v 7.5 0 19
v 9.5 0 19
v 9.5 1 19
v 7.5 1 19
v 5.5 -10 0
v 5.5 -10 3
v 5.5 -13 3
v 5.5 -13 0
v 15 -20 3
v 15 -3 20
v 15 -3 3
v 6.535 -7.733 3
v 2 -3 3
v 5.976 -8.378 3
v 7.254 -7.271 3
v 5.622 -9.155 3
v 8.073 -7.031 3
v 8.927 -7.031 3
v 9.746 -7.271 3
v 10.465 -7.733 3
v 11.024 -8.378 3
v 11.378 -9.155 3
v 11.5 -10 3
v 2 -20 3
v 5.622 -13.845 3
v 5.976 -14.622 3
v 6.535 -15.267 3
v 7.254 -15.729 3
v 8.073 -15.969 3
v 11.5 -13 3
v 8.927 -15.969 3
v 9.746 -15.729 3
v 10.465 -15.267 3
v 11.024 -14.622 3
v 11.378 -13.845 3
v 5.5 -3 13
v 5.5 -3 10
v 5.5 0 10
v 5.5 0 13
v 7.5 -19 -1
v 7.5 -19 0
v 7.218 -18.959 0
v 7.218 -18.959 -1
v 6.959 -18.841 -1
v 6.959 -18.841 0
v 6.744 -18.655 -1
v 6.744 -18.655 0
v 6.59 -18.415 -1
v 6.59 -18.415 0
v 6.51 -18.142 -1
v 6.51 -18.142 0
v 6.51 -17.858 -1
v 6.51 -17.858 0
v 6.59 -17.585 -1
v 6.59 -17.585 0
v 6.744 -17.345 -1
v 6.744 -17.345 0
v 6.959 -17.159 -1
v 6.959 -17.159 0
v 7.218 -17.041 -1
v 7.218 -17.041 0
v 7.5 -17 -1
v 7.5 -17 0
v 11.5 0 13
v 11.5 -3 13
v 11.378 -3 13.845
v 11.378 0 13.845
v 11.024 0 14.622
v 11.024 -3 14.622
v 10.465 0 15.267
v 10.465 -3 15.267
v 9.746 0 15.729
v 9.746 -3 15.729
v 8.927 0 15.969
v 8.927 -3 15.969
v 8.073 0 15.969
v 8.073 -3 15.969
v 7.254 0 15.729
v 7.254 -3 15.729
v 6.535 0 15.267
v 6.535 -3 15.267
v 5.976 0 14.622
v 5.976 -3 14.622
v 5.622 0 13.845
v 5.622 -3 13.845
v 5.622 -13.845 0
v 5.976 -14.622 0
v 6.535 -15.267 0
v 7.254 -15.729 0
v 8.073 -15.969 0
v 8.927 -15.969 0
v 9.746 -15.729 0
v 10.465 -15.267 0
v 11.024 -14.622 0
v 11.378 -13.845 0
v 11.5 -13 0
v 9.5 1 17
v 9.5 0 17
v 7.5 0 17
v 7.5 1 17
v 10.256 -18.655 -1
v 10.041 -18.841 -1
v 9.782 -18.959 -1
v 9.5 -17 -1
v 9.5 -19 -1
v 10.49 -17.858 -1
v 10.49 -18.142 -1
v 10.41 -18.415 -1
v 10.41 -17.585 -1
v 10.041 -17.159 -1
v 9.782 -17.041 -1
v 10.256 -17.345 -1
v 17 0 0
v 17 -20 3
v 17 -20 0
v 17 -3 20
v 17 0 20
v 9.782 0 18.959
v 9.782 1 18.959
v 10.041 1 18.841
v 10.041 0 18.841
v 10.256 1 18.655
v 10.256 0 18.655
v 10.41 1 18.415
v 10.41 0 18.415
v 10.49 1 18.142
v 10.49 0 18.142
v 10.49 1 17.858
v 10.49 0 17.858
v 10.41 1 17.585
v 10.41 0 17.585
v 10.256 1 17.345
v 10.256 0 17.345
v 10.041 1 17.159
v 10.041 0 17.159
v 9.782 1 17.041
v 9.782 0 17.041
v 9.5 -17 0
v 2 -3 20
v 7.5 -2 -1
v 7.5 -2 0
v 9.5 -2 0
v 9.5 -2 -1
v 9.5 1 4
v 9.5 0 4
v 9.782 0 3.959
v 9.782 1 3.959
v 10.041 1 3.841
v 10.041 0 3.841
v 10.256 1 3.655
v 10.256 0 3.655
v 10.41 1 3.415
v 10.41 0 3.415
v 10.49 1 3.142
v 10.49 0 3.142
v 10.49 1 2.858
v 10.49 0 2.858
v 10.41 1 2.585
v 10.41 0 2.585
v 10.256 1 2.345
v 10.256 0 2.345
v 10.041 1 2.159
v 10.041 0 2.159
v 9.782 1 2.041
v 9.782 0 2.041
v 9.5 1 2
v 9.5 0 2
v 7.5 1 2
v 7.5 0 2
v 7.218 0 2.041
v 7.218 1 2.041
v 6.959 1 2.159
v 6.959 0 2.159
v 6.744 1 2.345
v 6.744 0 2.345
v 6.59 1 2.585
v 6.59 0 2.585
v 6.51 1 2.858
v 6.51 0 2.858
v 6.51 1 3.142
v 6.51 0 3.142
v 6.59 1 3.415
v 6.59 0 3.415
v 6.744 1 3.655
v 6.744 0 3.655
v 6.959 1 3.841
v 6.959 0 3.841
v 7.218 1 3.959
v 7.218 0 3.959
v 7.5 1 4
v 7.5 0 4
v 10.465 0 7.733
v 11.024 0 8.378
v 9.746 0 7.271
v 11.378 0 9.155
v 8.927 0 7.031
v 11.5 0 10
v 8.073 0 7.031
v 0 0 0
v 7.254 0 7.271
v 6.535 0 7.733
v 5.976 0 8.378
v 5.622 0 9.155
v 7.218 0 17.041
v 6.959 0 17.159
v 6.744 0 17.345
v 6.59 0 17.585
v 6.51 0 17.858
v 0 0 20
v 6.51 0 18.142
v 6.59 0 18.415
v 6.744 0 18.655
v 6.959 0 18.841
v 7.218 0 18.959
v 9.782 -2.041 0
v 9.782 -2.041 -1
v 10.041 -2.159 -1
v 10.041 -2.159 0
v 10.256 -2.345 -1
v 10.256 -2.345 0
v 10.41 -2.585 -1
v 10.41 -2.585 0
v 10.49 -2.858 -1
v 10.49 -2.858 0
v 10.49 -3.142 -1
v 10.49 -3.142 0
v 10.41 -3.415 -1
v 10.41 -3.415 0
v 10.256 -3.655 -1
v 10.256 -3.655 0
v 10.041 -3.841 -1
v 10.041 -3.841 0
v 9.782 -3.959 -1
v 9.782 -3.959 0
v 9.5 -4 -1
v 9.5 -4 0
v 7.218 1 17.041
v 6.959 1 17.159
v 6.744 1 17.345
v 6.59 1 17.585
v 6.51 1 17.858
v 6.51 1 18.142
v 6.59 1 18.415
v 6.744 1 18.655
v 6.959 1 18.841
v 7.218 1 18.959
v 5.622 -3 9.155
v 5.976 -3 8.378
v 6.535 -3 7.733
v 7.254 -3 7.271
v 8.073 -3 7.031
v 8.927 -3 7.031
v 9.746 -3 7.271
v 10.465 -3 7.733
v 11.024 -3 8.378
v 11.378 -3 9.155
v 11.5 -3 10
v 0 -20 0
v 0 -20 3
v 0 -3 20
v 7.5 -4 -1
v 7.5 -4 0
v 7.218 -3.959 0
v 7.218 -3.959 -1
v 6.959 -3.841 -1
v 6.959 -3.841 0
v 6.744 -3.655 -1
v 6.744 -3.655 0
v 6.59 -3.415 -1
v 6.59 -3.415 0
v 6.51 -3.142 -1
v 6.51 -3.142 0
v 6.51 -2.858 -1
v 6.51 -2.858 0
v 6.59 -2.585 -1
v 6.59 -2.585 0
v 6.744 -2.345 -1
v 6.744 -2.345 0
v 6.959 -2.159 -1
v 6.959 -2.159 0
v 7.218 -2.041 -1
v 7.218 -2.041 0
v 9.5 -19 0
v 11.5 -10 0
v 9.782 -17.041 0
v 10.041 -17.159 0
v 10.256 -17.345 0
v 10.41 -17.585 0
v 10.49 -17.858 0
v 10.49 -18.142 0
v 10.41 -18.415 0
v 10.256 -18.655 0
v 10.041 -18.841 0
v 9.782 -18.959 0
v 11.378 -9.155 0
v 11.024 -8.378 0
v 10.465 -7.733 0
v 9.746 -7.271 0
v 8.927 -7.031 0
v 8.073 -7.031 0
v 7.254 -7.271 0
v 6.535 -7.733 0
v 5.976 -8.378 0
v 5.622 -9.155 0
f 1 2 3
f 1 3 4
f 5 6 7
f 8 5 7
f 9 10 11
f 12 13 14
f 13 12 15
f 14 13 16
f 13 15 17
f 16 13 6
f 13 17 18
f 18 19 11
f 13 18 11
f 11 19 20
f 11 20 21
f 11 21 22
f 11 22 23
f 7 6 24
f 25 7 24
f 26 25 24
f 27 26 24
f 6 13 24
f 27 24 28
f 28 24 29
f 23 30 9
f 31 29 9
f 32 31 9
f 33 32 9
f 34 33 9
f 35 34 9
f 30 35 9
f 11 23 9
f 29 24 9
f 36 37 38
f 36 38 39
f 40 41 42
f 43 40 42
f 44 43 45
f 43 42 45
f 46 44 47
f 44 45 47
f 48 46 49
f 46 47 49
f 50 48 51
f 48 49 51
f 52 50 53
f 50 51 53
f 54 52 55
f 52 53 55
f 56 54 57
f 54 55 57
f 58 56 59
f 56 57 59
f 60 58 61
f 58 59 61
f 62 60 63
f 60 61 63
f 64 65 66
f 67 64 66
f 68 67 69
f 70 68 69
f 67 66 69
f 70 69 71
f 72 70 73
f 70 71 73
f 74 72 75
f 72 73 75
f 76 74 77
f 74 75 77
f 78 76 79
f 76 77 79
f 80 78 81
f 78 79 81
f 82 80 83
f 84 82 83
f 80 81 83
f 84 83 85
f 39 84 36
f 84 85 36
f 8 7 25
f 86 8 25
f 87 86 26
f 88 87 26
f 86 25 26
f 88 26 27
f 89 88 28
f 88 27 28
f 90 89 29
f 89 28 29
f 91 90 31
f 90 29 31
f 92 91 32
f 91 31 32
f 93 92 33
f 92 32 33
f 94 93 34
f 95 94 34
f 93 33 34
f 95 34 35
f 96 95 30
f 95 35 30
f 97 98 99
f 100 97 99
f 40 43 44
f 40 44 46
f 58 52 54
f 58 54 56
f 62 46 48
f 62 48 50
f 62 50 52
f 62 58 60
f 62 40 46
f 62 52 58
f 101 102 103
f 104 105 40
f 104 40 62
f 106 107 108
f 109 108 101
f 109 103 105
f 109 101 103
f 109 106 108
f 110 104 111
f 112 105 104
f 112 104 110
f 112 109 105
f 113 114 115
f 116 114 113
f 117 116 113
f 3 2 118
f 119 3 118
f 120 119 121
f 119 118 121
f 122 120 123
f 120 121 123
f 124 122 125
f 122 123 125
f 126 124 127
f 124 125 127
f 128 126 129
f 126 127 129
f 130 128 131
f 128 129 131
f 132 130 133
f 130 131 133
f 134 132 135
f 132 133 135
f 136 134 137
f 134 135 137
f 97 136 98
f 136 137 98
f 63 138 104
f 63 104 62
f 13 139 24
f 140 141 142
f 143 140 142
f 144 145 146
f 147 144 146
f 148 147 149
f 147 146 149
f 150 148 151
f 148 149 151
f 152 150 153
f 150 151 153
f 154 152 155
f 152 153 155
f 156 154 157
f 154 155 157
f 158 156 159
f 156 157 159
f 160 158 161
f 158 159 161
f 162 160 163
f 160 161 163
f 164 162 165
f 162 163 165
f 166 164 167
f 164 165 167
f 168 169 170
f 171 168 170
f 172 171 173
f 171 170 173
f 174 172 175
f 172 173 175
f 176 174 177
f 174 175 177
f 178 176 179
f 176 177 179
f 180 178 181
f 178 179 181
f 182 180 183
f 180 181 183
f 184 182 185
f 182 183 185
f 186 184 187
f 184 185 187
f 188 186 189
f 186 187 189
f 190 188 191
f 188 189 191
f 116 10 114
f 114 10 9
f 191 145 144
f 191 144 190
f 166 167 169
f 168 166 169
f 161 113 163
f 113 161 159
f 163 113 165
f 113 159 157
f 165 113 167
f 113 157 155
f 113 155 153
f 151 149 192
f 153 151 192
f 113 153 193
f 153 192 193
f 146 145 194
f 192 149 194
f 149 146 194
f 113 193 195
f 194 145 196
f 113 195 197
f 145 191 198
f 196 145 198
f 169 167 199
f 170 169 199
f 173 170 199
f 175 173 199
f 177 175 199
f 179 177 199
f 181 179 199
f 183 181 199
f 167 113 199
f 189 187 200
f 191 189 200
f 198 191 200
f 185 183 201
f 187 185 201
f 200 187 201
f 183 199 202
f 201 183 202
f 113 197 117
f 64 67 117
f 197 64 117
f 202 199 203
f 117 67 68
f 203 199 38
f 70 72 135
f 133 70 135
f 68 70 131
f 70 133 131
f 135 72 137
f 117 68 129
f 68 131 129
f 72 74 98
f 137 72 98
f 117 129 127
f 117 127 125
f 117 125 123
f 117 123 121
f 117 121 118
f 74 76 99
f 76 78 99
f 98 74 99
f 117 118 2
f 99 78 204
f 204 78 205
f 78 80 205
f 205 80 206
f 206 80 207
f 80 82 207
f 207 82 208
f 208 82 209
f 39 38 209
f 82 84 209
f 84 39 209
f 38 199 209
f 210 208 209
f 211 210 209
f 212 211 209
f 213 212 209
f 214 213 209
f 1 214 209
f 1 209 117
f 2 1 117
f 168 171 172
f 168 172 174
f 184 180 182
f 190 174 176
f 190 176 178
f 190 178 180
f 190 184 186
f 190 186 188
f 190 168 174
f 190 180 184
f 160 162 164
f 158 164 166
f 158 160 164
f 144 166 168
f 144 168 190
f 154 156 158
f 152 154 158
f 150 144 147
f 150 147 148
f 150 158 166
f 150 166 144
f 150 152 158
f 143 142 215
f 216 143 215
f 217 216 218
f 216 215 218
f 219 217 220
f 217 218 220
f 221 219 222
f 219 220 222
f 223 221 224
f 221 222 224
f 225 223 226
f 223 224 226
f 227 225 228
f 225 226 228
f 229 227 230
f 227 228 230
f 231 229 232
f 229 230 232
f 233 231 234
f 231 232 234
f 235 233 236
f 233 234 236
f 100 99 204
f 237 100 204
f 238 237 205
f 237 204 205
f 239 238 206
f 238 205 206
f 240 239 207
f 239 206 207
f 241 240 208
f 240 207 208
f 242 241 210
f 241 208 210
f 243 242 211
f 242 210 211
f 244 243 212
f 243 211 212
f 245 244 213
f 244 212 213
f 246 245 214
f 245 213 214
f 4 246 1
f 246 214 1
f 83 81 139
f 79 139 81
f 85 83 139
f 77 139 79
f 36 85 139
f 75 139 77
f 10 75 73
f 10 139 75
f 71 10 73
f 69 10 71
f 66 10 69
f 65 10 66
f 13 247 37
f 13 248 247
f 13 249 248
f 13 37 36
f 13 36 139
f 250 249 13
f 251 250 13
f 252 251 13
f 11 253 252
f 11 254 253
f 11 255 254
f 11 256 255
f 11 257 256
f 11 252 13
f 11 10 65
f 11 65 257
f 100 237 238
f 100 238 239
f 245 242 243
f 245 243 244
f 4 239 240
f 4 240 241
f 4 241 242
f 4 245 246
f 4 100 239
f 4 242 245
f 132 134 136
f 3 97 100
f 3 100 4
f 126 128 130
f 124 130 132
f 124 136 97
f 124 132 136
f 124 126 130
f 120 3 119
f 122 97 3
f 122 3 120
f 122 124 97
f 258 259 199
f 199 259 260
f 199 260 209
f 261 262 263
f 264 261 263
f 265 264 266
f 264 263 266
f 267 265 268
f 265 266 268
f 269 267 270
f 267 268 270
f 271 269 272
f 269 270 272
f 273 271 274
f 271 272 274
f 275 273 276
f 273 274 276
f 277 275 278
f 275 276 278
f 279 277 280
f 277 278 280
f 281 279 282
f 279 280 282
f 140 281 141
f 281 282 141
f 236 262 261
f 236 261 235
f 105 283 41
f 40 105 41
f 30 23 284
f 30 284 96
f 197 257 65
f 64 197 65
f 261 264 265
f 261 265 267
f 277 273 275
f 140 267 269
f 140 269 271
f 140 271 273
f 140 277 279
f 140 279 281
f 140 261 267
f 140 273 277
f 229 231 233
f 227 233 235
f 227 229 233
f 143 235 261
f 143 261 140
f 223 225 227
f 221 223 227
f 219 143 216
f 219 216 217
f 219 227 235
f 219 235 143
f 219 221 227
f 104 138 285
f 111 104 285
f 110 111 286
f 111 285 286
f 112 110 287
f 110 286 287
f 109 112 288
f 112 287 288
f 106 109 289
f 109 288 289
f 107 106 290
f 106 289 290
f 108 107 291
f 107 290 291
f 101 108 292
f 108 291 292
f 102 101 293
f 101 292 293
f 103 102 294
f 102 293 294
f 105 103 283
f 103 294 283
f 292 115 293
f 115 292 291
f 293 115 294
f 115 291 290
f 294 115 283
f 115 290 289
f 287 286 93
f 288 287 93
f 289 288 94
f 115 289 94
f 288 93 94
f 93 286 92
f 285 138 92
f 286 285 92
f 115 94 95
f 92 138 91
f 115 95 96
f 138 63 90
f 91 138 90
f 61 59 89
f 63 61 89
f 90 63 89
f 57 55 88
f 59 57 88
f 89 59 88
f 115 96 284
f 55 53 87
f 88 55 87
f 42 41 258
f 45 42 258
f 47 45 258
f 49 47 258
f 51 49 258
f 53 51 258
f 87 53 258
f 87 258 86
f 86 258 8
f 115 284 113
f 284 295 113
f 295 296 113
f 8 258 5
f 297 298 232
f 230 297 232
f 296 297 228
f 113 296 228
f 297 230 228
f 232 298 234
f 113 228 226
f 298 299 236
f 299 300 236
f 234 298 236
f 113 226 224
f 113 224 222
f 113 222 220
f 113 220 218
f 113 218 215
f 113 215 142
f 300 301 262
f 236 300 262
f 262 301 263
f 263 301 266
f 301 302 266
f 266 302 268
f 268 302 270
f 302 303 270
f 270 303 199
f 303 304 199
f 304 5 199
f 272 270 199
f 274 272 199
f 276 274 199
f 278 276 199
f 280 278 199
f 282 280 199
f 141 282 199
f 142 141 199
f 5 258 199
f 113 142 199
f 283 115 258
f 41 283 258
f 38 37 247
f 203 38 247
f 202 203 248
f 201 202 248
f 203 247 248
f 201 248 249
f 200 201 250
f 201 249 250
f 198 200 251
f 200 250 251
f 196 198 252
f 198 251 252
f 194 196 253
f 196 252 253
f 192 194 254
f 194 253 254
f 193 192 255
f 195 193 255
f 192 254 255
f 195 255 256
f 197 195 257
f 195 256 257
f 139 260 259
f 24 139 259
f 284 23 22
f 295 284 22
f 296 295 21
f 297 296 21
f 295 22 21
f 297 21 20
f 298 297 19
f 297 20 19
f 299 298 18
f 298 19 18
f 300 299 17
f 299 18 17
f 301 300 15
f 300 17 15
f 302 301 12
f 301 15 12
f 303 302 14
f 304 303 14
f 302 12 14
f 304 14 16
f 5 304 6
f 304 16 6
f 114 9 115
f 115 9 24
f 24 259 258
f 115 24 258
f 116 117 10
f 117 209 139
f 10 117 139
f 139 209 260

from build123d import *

# Parameters (mm, degrees)
PAD_DEPTH       = 17
SKETCH001_W     = 17
SKETCH001_H     = 13
POCKET_DEPTH    = 17
POCKET001_DEPTH = 3
POCKET002_DEPTH = 3
PAD001_DEPTH    = 1
PAD002_DEPTH    = 1


with BuildPart() as part:
    # Sketch → Pad (new body)
    with BuildSketch(Plane.YZ):
        Polygon((0, 0), (0, 20), (-3, 20), (-20, 3), (-20, 0), align=None)
    extrude(amount=PAD_DEPTH)

    # Sketch001 (on Face4 of Pad) → Pocket (cut)
    with BuildSketch(Plane(origin=(0, -20, 0), x_dir=(0, 0, -1), z_dir=(0, -1, 0))):
        with Locations((-11.5, 8.5)):
            Rectangle(SKETCH001_W, SKETCH001_H)
    extrude(amount=-POCKET_DEPTH, mode=Mode.SUBTRACT)

    # Sketch002 (on Face8 of Pocket) → Pocket001 (cut)
    with BuildSketch(Plane(origin=(0, -3, 0), x_dir=(0, 0, -1), z_dir=(0, -1, 0))):
        with BuildLine():
            ThreePointArc((-10, 5.5), (-7, 8.5), (-10, 11.5))
            Line((-10, 11.5), (-13, 11.5))
            ThreePointArc((-13, 11.5), (-16, 8.5), (-13, 5.5))
            Line((-10, 5.5), (-13, 5.5))
        make_face()
    extrude(amount=-POCKET001_DEPTH, mode=Mode.SUBTRACT)

    # Sketch003 (on Face14 of Pocket001) → Pocket002 (cut)
    with BuildSketch(Plane(origin=(0, 0, 3), x_dir=(0, -1, 0), z_dir=(0, 0, 1))):
        with BuildLine():
            ThreePointArc((10, 11.5), (7, 8.5), (10, 5.5))
            Line((10, 5.5), (13, 5.5))
            ThreePointArc((13, 5.5), (16, 8.5), (13, 11.5))
            Line((10, 11.5), (13, 11.5))
        make_face()
    extrude(amount=-POCKET002_DEPTH, mode=Mode.SUBTRACT)

    # Sketch004 (on Face1 of Pocket002) → Pad001 (join)
    with BuildSketch(Plane.ZX):
        with BuildLine():
            ThreePointArc((4, 9.5), (3, 10.5), (2, 9.5))
            Line((2, 9.5), (2, 7.5))
            ThreePointArc((2, 7.5), (3, 6.5), (4, 7.5))
            Line((4, 9.5), (4, 7.5))
        make_face()
        with BuildLine():
            ThreePointArc((19, 9.5), (18, 10.5), (17, 9.5))
            Line((17, 9.5), (17, 7.5))
            ThreePointArc((17, 7.5), (18, 6.5), (19, 7.5))
            Line((19, 9.5), (19, 7.5))
        make_face()
    extrude(amount=PAD001_DEPTH)

    # Sketch005 (on Face2 of Pad001) → Pad002 (join)
    with BuildSketch(Plane.YX):
        with BuildLine():
            ThreePointArc((-4, 7.5), (-3, 6.5), (-2, 7.5))
            Line((-2, 7.5), (-2, 9.5))
            ThreePointArc((-2, 9.5), (-3, 10.5), (-4, 9.5))
            Line((-4, 7.5), (-4, 9.5))
        make_face()
        with BuildLine():
            ThreePointArc((-17, 9.5), (-18, 10.5), (-19, 9.5))
            Line((-19, 9.5), (-19, 7.5))
            ThreePointArc((-19, 7.5), (-18, 6.5), (-17, 7.5))
            Line((-17, 9.5), (-17, 7.5))
        make_face()
    extrude(amount=PAD002_DEPTH)


solid = part.part
